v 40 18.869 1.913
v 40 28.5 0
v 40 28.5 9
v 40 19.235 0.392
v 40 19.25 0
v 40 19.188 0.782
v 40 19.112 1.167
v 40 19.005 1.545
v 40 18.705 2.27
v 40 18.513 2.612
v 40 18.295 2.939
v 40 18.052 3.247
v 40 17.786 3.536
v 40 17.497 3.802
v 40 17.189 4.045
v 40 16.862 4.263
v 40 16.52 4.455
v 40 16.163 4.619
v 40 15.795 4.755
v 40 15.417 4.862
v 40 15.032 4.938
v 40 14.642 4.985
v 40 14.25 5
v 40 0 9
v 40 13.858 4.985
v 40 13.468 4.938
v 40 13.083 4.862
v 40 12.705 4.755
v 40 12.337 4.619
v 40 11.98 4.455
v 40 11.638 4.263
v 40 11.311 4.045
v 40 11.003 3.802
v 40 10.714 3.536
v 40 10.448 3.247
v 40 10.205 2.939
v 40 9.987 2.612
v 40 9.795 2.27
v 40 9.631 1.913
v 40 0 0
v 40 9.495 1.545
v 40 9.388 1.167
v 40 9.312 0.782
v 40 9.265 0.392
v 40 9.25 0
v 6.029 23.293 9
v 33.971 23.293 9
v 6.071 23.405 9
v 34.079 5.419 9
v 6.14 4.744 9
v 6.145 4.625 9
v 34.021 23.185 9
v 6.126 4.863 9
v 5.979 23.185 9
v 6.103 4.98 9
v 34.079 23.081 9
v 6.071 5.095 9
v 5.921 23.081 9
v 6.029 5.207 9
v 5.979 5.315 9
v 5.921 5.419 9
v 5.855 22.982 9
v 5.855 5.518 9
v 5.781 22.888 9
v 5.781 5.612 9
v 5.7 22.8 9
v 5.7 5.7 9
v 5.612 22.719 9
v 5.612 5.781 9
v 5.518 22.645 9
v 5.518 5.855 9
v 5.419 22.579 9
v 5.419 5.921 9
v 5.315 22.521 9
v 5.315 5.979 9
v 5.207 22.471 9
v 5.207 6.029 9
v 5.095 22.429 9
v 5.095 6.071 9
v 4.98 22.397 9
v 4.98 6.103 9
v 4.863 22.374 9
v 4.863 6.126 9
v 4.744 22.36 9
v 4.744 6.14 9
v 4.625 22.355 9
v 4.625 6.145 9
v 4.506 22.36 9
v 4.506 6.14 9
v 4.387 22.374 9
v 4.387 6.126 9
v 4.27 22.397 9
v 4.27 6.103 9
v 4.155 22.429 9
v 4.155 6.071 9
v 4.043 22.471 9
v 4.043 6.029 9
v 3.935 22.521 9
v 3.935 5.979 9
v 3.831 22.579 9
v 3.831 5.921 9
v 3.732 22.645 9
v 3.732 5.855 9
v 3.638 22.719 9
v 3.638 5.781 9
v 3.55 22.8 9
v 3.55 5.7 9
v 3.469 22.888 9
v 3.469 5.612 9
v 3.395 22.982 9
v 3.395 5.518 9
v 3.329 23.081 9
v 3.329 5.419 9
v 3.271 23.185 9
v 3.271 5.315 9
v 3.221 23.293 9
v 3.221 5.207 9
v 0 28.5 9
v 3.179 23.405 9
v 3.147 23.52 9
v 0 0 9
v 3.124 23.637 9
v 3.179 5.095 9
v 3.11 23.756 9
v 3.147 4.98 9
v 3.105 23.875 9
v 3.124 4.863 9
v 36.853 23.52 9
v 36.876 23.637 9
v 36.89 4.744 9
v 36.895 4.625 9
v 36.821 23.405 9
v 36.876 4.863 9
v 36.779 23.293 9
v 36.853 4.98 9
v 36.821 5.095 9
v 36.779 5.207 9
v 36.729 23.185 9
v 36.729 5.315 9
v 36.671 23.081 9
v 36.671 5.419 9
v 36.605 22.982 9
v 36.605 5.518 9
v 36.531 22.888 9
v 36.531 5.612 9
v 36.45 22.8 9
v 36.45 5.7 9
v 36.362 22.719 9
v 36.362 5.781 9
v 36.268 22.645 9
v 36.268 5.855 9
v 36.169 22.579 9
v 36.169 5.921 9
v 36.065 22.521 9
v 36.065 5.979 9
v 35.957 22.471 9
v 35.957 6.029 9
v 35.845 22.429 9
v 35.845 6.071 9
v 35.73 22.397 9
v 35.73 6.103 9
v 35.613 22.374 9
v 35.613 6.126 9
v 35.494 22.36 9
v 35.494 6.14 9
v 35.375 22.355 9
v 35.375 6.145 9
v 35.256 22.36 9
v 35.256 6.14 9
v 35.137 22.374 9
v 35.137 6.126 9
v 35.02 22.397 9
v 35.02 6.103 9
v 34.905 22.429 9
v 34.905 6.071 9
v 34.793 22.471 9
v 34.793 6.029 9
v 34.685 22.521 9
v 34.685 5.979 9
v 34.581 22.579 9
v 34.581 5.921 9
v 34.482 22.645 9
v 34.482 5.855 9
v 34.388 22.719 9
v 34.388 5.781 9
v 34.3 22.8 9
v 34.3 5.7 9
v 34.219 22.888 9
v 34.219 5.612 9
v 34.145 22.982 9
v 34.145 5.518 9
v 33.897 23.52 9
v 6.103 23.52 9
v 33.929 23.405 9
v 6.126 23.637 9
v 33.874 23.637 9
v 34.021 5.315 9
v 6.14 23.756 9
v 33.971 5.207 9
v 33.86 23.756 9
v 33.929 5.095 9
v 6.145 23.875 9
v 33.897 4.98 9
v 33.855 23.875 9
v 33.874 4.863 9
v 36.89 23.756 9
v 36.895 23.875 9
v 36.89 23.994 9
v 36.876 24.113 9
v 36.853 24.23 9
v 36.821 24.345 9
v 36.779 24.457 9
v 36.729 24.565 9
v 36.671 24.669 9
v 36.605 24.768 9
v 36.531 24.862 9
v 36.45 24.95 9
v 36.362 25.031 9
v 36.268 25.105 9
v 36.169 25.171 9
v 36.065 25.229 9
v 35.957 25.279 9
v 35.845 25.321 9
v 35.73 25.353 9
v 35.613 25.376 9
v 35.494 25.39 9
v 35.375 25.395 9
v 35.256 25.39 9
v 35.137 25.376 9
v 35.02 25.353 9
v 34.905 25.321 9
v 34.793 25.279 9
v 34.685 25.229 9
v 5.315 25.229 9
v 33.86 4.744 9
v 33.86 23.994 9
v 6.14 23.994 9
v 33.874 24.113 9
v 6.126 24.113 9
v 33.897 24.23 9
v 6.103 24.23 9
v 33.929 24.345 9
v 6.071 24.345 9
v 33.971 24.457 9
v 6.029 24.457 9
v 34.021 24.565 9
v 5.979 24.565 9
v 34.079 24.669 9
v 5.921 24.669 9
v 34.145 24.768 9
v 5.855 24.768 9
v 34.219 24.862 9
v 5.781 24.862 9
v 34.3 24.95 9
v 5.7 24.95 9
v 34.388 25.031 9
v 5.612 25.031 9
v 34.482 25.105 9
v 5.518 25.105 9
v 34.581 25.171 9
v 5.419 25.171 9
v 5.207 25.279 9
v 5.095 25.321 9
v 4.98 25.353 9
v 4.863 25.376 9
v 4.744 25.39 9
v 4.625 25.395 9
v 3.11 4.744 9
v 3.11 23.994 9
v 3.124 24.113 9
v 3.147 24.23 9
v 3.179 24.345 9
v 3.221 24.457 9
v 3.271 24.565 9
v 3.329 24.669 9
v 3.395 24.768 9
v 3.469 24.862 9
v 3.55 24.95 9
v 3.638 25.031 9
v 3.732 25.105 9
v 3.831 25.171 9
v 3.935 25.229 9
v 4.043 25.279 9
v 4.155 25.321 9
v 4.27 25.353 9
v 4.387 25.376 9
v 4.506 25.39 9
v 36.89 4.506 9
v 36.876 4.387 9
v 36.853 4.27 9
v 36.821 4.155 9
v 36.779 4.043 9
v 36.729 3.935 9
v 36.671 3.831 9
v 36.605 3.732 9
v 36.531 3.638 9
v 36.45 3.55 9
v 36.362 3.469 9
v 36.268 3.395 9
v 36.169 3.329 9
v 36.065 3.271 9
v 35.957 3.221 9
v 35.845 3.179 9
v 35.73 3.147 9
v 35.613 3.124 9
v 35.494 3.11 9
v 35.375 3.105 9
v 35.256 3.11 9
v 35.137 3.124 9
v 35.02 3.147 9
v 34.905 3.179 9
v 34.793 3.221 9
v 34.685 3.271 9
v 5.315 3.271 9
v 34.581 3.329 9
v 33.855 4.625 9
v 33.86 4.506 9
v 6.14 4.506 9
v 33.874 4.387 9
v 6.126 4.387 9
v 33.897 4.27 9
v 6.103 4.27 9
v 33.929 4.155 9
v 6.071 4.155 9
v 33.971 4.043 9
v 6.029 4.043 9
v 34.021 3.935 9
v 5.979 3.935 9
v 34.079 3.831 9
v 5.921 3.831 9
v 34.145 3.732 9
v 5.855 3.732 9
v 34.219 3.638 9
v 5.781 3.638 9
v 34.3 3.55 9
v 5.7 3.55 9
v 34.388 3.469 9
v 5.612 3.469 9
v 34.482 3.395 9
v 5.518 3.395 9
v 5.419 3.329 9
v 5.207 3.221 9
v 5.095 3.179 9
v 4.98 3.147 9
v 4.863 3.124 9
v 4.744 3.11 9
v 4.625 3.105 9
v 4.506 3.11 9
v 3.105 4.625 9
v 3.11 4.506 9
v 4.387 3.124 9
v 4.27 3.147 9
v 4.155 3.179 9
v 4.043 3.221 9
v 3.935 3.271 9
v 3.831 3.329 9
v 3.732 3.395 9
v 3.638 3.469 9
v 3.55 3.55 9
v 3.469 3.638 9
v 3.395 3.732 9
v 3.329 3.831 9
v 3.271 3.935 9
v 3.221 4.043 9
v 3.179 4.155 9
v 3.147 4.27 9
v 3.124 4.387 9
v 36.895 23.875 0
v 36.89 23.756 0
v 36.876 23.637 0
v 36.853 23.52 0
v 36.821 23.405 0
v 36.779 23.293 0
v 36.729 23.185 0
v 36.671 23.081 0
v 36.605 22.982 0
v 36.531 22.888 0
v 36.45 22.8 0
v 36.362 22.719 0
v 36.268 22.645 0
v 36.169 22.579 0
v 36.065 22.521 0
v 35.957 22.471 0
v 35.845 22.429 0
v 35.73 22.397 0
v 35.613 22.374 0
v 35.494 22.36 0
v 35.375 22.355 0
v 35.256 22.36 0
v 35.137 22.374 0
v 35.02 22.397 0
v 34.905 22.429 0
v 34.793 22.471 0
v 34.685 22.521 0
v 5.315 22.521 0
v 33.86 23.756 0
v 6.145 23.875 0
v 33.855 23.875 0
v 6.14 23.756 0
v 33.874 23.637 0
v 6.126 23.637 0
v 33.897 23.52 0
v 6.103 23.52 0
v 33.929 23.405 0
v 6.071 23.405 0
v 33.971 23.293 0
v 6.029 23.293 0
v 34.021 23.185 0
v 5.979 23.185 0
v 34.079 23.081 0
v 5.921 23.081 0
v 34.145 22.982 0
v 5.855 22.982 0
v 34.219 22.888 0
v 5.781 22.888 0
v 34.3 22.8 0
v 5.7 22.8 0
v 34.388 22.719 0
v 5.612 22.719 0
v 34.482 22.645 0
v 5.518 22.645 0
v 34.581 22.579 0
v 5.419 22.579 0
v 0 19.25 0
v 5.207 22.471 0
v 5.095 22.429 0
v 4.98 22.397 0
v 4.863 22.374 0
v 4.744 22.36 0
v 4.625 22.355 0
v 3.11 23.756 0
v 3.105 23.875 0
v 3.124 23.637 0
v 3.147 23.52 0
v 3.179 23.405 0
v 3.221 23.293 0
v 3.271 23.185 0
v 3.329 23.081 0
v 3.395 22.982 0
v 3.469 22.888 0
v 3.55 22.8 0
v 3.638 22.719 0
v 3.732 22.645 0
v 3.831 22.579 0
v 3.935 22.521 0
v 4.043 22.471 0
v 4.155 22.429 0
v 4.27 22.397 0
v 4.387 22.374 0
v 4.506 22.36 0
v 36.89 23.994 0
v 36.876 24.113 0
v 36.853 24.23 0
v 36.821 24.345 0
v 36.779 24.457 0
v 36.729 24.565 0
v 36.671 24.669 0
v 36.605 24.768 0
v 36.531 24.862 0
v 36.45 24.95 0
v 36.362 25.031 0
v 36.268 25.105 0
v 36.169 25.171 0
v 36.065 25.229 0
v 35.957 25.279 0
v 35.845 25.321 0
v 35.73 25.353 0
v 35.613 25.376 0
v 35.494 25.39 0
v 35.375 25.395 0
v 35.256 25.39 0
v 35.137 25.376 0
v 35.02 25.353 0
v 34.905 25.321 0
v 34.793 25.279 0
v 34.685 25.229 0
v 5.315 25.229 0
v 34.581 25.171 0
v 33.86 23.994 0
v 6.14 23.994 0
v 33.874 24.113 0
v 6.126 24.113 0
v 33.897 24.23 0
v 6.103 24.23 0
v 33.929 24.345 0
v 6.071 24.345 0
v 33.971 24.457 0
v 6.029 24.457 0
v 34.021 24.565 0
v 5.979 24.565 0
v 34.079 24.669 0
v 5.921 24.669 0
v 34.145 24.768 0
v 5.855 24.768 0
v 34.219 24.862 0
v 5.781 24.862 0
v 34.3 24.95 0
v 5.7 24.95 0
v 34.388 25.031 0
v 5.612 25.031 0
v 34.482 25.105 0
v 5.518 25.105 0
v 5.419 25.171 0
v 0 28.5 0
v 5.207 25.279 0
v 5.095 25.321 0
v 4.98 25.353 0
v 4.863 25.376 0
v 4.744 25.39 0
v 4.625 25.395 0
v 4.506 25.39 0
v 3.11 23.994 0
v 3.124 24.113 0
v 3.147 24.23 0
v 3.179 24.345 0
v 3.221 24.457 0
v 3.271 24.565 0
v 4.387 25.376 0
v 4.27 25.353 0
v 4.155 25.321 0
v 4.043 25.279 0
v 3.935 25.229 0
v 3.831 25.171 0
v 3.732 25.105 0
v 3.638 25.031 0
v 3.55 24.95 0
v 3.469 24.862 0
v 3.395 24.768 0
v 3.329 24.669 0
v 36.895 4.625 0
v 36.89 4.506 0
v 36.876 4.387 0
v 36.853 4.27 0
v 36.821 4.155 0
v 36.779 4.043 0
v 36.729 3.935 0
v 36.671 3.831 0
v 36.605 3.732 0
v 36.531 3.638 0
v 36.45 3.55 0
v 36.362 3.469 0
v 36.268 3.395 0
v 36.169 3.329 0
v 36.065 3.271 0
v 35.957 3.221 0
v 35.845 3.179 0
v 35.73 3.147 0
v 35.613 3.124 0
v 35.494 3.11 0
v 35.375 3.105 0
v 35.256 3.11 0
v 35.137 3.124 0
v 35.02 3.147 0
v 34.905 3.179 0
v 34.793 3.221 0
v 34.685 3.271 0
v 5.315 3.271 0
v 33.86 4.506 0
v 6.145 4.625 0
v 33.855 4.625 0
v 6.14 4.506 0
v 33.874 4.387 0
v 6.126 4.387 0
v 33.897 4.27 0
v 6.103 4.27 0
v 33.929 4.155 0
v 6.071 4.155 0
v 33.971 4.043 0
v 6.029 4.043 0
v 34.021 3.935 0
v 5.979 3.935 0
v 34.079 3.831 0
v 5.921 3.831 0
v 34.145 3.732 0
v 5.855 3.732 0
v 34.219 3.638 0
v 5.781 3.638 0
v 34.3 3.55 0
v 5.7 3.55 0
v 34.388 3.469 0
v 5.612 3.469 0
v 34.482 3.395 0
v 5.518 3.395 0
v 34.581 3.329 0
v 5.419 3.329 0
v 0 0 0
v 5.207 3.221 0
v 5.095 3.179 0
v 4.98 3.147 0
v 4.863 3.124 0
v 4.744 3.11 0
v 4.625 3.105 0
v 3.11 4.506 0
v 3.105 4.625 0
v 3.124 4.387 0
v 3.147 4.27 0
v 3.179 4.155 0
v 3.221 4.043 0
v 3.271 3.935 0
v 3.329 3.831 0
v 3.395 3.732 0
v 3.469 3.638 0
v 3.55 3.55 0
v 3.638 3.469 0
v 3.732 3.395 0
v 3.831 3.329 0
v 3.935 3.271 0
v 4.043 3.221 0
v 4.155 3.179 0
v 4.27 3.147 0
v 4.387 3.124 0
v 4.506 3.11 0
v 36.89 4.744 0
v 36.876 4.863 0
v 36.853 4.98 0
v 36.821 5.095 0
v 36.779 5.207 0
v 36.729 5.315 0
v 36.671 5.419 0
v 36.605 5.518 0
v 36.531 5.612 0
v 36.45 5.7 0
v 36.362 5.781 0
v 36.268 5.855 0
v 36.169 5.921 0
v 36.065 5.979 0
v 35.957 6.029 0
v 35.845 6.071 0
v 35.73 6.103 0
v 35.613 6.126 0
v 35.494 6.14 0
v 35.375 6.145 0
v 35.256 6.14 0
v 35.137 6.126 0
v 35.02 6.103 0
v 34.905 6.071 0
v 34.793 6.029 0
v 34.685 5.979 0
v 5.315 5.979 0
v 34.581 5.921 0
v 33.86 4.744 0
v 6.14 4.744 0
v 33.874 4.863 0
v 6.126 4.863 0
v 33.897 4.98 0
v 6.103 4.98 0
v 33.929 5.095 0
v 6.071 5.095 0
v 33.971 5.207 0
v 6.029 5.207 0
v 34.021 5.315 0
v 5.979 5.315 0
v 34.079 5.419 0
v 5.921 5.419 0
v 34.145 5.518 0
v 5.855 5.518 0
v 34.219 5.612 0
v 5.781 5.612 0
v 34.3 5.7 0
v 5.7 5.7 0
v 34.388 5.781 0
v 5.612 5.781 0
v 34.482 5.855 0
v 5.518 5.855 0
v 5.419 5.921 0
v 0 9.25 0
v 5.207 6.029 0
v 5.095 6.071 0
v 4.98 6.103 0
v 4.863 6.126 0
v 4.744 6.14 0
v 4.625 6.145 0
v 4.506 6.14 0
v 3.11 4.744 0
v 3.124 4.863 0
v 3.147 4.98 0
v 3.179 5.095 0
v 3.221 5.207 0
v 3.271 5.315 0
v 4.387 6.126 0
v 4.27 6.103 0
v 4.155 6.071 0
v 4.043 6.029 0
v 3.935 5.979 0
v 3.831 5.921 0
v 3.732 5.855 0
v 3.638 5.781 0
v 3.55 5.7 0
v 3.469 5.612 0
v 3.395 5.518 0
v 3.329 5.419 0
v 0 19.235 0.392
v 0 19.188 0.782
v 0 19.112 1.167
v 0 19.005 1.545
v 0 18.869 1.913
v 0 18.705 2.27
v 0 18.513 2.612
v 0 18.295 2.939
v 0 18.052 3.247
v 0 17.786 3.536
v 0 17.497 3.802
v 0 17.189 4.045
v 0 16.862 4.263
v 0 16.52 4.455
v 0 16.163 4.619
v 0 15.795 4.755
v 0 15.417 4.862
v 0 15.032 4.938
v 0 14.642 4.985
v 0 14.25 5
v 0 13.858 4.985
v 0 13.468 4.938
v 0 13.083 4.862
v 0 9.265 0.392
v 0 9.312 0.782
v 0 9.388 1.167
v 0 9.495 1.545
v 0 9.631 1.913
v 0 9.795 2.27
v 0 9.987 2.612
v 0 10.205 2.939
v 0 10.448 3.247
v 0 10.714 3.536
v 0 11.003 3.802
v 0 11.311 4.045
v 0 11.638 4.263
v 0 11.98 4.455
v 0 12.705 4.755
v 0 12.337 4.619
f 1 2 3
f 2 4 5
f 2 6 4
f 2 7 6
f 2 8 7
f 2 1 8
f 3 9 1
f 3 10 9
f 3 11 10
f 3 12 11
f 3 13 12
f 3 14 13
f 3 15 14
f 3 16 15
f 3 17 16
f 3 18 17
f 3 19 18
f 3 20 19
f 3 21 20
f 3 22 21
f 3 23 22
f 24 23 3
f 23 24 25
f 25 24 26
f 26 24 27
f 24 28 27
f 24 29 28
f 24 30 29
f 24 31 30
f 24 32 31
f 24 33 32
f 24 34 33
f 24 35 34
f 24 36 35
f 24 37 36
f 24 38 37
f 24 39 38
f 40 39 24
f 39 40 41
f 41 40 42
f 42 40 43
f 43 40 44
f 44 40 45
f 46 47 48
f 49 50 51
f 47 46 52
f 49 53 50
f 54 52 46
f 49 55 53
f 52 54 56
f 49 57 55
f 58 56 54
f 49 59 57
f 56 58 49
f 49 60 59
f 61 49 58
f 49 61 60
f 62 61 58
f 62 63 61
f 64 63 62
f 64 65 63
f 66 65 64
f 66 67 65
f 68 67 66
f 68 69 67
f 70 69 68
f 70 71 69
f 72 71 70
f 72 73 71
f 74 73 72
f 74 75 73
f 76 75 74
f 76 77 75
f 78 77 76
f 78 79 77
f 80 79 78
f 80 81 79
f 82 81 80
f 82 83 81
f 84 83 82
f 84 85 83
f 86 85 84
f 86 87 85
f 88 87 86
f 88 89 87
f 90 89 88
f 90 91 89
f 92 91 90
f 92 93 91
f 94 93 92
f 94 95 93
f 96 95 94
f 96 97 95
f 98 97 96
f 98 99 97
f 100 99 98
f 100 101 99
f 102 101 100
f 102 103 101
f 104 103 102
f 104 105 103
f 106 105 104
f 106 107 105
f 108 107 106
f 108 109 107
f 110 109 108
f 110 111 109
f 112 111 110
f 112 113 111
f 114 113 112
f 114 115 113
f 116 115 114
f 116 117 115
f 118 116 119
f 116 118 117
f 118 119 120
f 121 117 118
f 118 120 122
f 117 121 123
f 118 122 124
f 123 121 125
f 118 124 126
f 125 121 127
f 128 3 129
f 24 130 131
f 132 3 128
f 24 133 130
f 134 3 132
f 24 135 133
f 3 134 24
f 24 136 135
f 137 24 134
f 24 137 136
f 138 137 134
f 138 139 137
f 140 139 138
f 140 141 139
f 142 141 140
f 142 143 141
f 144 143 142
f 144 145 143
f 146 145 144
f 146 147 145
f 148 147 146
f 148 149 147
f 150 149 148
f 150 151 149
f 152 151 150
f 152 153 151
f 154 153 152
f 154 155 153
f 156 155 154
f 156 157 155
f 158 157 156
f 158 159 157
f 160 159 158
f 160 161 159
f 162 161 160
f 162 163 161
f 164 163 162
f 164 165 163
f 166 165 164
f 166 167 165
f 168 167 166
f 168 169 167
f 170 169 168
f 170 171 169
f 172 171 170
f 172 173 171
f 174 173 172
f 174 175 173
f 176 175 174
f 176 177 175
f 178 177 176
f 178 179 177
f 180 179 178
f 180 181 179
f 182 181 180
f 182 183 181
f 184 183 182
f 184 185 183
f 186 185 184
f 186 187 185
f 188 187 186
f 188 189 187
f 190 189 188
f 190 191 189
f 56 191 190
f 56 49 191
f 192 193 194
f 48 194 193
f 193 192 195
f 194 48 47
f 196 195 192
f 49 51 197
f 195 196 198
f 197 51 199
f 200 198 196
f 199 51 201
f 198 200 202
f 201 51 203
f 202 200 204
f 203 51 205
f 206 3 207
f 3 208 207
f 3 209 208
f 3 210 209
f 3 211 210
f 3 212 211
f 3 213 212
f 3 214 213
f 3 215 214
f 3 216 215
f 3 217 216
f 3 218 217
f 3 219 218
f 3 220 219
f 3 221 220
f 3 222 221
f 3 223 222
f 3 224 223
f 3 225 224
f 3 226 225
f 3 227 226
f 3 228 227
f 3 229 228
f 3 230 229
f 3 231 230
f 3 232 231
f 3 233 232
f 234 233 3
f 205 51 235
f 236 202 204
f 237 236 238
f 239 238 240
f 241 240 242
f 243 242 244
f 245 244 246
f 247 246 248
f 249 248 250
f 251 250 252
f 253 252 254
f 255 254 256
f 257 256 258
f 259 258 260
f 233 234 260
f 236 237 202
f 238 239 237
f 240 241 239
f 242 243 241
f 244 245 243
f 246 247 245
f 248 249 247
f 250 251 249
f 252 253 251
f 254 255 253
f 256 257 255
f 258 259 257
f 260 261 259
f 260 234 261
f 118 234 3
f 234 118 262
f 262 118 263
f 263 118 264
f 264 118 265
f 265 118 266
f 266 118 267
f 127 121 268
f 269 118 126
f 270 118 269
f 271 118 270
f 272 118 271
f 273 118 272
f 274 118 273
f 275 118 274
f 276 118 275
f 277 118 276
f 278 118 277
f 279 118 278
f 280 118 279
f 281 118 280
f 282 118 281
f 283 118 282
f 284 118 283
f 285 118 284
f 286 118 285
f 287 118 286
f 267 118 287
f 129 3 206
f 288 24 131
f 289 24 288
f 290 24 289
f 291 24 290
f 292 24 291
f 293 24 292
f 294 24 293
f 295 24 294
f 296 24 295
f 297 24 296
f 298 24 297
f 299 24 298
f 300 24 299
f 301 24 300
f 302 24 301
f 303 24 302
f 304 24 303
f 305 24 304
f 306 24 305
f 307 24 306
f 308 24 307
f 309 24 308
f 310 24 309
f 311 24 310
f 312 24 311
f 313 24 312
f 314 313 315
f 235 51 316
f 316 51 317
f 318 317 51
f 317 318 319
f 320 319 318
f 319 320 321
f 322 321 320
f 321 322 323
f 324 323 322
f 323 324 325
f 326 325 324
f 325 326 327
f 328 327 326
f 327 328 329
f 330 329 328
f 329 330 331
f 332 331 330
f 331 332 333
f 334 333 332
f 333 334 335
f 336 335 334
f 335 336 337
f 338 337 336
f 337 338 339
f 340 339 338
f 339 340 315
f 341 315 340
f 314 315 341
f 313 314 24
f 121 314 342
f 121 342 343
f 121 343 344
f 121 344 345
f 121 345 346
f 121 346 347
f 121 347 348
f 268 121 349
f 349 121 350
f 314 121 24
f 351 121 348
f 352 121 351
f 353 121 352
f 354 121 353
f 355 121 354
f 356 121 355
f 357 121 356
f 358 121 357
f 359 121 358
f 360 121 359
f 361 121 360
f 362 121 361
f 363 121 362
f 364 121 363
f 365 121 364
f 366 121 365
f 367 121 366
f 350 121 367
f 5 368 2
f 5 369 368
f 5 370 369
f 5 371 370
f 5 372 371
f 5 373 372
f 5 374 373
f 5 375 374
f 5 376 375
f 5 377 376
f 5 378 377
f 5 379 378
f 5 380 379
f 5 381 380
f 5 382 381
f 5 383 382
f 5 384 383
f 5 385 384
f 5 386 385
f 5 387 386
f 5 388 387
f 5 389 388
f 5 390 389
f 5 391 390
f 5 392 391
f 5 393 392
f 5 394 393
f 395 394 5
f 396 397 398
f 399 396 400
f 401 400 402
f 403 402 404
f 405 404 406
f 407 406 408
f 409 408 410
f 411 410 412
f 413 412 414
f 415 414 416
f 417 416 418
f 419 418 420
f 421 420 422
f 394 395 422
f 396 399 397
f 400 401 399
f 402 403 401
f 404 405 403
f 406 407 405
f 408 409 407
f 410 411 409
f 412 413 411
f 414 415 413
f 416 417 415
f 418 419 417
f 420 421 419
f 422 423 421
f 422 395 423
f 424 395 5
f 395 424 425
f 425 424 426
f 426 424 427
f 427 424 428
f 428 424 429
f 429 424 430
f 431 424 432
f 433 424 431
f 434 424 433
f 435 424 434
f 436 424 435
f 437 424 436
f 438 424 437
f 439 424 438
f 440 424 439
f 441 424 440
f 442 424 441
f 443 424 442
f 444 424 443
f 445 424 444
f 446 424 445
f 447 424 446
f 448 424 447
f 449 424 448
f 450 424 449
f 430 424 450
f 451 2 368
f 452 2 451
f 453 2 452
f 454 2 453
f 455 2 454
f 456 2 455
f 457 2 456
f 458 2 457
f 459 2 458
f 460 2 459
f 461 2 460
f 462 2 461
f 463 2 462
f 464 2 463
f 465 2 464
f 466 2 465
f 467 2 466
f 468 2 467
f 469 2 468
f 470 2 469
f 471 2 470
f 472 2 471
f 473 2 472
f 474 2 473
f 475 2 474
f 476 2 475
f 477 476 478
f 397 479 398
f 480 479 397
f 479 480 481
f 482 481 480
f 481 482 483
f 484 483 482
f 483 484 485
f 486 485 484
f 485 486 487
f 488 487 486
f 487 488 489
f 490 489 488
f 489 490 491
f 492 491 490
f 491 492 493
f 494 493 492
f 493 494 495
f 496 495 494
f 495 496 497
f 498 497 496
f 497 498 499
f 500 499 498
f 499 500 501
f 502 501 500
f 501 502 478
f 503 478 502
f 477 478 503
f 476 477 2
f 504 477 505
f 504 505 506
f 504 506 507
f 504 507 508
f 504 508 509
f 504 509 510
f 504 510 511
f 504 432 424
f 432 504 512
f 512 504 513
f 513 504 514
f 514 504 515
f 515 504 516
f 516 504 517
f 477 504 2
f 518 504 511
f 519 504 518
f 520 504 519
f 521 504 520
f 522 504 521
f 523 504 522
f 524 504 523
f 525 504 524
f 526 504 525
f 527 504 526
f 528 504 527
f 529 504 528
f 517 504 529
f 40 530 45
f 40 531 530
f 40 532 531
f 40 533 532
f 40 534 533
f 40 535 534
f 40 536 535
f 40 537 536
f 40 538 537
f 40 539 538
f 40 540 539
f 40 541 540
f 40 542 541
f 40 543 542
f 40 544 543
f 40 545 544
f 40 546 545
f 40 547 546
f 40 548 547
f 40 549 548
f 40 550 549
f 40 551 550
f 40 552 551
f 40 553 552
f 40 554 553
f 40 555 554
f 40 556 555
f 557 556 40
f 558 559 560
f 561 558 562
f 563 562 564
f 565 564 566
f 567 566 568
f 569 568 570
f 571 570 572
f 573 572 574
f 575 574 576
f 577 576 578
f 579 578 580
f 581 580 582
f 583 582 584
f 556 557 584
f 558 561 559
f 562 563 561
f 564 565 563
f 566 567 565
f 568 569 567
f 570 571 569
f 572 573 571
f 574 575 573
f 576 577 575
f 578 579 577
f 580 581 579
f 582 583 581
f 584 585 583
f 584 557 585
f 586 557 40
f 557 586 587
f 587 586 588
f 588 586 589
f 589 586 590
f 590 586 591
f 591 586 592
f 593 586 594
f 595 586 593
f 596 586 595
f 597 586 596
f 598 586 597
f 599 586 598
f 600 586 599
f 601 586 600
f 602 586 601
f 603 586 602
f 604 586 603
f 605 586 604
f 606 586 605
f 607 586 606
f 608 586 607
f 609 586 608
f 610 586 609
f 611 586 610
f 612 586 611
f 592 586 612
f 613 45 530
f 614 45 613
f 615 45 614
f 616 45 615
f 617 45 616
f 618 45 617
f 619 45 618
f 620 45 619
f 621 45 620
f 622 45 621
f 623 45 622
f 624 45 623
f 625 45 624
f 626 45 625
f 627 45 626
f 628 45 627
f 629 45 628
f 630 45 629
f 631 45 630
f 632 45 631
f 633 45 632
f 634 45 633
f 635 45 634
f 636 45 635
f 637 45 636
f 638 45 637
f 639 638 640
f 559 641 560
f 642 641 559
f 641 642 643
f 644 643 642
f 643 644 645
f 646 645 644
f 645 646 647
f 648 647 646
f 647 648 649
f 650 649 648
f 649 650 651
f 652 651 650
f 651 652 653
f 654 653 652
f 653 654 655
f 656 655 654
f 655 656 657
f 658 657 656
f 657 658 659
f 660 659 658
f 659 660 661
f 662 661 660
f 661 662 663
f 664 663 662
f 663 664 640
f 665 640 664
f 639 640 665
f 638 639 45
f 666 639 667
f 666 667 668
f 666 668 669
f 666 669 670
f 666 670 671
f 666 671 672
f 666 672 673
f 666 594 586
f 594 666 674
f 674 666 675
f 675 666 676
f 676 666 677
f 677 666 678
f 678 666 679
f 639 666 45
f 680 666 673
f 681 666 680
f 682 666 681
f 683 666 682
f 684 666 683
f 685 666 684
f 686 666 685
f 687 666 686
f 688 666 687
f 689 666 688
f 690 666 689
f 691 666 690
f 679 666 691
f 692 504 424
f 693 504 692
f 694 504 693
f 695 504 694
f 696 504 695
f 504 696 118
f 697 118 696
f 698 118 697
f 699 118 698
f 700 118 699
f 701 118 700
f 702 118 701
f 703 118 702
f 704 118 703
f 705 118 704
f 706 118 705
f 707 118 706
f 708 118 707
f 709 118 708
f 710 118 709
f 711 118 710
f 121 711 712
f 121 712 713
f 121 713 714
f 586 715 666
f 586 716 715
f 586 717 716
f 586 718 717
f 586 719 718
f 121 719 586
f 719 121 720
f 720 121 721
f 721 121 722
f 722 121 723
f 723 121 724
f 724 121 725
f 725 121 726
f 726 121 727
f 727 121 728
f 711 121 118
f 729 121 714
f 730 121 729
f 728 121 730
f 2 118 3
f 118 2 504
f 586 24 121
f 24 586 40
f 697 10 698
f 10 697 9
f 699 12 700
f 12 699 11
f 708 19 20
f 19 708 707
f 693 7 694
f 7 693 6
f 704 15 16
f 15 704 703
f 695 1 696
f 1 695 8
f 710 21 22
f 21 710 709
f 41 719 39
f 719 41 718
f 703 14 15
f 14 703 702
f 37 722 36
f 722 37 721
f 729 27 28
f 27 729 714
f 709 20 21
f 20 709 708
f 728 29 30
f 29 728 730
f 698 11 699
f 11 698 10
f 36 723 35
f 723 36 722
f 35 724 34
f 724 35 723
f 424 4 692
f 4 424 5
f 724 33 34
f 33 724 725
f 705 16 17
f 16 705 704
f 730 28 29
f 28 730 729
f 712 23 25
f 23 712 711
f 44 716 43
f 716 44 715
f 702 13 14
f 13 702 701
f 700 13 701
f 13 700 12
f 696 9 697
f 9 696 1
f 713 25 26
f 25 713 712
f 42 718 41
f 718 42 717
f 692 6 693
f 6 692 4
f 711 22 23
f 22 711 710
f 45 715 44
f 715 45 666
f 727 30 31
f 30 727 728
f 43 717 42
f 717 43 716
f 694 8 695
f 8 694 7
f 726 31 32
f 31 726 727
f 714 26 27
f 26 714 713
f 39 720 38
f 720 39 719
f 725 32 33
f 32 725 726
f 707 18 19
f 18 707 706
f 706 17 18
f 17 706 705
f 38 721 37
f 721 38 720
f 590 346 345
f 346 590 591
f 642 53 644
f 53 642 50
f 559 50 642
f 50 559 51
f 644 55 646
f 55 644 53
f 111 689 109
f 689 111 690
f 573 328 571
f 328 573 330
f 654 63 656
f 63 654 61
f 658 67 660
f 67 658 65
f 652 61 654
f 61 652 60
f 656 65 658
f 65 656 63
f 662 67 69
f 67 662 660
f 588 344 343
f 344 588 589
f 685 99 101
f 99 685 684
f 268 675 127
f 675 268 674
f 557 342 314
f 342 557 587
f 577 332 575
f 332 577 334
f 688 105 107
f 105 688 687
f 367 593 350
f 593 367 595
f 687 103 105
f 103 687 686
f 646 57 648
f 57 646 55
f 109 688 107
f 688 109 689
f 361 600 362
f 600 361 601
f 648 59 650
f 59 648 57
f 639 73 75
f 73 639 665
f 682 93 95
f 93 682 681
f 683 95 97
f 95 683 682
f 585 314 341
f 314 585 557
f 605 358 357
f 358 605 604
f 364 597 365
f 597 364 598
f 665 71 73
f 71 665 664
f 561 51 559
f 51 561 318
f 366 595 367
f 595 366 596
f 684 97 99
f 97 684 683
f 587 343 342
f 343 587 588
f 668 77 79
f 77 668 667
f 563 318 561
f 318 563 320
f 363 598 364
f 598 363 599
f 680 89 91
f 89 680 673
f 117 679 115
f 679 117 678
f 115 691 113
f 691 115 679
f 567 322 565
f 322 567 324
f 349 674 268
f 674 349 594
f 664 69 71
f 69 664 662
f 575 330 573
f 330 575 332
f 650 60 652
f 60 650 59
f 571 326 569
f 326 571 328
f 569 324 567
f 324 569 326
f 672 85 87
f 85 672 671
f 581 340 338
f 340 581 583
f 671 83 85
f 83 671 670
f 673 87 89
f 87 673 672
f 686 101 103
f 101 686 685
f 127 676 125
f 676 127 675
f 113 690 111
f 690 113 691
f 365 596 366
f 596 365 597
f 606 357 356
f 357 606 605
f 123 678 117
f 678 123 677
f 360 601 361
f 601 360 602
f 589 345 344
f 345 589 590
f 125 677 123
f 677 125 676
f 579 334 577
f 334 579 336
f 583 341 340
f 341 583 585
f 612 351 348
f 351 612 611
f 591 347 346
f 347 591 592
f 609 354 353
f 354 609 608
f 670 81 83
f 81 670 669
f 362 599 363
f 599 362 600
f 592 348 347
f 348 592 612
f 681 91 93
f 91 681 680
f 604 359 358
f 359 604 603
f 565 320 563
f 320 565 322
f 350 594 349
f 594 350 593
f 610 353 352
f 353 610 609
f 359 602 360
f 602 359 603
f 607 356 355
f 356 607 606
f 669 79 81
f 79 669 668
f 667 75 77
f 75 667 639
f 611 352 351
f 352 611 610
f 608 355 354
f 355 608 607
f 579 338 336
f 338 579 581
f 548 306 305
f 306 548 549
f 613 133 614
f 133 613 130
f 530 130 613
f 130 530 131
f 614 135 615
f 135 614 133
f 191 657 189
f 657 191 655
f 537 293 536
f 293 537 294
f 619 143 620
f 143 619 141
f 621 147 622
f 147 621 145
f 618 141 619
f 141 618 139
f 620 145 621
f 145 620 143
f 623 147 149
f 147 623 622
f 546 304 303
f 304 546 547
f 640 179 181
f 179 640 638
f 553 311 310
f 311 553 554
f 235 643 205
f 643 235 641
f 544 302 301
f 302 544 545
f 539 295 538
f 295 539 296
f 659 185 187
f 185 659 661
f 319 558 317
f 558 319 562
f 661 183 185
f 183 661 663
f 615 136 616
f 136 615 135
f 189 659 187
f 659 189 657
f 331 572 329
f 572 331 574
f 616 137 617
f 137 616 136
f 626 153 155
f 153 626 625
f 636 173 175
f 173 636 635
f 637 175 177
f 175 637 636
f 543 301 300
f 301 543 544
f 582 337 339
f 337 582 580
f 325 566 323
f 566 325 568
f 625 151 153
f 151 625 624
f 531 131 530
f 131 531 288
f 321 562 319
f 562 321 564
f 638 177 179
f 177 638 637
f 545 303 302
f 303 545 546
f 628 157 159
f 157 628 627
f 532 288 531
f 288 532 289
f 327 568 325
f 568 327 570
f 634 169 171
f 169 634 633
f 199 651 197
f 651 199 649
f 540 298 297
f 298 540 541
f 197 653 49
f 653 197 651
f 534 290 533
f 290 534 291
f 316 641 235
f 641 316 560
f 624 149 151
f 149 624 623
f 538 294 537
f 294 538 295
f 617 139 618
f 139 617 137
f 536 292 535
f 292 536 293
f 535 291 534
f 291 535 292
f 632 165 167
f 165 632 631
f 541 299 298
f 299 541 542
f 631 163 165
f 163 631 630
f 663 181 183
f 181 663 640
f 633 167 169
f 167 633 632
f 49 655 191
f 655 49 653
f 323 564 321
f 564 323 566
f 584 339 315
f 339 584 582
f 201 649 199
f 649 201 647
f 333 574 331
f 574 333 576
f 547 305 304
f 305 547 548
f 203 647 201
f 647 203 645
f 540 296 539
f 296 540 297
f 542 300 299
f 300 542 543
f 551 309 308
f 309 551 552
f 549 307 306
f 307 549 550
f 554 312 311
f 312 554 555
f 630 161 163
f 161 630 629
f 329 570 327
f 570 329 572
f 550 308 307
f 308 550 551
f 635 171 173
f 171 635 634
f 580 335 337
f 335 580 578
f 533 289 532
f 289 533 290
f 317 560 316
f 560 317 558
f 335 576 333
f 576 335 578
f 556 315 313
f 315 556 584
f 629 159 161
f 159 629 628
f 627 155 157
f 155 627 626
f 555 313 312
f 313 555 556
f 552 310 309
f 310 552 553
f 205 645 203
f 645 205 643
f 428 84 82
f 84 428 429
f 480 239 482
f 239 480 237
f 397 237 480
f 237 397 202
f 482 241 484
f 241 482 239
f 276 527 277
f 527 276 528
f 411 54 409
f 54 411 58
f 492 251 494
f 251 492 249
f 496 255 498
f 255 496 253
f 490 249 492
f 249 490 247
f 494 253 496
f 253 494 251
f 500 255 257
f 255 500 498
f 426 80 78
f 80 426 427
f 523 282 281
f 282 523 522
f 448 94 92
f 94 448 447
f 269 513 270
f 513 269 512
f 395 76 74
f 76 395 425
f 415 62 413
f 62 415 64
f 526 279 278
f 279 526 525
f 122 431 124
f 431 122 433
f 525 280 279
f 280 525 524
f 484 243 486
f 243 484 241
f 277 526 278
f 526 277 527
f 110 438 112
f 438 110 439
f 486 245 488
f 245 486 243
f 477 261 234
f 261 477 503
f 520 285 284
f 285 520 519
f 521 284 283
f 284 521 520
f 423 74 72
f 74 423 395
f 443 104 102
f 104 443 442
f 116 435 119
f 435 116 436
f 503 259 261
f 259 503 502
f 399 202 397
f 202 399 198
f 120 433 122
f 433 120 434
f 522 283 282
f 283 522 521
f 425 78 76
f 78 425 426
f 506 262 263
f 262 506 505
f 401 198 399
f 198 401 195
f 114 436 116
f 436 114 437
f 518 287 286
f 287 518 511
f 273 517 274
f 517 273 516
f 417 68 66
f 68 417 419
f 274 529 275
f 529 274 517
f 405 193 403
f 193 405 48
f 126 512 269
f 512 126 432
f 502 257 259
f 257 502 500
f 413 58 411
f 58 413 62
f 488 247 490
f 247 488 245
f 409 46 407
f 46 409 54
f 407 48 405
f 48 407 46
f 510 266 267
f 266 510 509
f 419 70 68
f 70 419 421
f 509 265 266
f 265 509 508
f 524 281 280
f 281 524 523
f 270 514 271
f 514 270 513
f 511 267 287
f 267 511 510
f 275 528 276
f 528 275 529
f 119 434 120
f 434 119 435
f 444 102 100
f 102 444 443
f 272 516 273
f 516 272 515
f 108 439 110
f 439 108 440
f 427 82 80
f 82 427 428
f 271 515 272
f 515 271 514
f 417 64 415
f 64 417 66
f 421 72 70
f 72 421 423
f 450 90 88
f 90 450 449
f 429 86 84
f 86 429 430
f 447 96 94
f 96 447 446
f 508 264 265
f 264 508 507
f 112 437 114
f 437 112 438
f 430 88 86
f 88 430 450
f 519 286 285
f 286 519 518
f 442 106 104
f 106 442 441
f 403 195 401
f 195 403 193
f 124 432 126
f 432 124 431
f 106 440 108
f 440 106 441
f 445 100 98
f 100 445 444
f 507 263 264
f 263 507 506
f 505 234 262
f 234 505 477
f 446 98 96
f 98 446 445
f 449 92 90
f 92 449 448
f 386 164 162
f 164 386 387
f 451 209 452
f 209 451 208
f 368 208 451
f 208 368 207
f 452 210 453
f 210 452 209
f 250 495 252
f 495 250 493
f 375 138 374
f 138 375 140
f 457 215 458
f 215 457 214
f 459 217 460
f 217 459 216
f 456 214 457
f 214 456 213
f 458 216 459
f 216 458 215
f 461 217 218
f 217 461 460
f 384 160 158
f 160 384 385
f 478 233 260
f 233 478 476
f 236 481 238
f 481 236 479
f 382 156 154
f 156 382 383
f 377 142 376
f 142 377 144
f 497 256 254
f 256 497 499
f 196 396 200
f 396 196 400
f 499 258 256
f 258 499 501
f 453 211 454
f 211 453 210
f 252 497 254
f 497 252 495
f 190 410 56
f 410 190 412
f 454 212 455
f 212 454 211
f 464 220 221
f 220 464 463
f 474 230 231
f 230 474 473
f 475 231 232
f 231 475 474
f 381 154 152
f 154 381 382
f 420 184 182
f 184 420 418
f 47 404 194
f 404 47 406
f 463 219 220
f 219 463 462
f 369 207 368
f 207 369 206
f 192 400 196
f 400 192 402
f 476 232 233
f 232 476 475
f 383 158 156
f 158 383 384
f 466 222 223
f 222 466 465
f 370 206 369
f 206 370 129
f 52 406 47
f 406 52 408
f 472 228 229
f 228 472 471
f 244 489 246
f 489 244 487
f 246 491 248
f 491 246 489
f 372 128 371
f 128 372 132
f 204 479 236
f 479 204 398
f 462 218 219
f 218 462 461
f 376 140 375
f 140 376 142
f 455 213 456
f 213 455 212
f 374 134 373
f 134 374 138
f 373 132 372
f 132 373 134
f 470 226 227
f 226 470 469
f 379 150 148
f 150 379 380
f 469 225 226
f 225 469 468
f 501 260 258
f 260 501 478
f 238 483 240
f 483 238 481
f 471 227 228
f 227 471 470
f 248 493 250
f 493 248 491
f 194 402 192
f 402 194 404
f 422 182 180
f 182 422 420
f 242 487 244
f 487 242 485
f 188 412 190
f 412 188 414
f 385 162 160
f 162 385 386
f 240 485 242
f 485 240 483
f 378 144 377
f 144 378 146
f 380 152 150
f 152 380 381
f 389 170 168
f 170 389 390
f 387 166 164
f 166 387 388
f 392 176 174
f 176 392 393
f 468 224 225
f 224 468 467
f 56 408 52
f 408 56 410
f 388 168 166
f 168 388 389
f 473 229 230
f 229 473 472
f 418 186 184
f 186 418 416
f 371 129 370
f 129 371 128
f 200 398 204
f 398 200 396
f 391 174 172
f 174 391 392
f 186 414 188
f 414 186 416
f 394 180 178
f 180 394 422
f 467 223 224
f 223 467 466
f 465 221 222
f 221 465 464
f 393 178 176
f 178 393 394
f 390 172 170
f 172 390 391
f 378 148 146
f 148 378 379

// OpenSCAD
// file: hex_nut.scad
module hex_nut(width, height, screw)
{
	w = width;
	w2 = width / 2;
	s = w2 / cos(30);
	h = w2 * tan(30);
	
	translate([-s/2, -w2, 0])
	difference()
	{
		linear_extrude(height=height)
			polygon([[0,0],[s,0],[s+h,w2],[s,w],[0,w],[-h,w2],[0,0]]);
		translate([s/2, w2, -0.1])
			cylinder(r = screw / 2, h = height+0.2, $fn=20);
	}
}

hex_nut(5.25, 2, 3);
// file: bearing_dims.scad
/*
	bore = v[0];
	outer = v[1];
	len = v[2];
	ring_space = v[3];
	ring_dia = v[4];
	ring_gap = v[5];
*/

linear_bearing_dims = [
	[3,7,10,0,7,0],
	[4,8,12,0,8,0],
	[5,10,15,10.2,9.6,1.1],
	[6,12,19,13.5,11.5,1.1],
	[8,15,24,17.5,14.3,1.1],
	[10,19,29,22,18,1.3],
	[12,21,30,23,20,1.3],
	[13,23,32,23,22,1.3],
	[16,28,37,26.5,27,1.6],
	[20,32,42,30.5,30.5,1.6],
	[25,40,59,41,38,1.85],
	[30,45,64,44.5,43,1.85],
	[35,52,70,49.5,49,2.1],
	[40,60,80,60.5,57,2.1],
	[50,80,100,74,76.5,2.6],
	[60,90,110,85,86.5,3.15],
	[80,120,140,105.5,116,4.15],
	[100,150,150,125.5,145,4.15]
];

/*
	d = v[0];
	h = v[1];
	e = v[2];
	w = v[3];		// overall width
	l = v[4];		// overall length
	f = v[5];
	g = v[6];
	b = v[7];		// screw spacing along width
	c = v[8];		// screw spacing along length
	k = v[9];
	t = v[10];
	s1 = v[11];
	s2 = v[12];
	L1 = v[13];
*/

linear_bearing_block_dims = [
	[6,9,15,30,25,18,15,20,15,5,6,4,3.4,8],
	[8,11,17,34,30,22,18,24,18,5,6,4,3.4,8],
	[10,13,20,40,35,26,21,28,21,6,8,5,4.3,12],
	[12,15,21,42,36,28,24,30.5,26,5.75,8,5,4.3,12],
	[13,15,22,44,39,30,24.5,33,26,5.5,8,5,4.3,12],
	[16,19,25,50,44,38.5,32.5,36,34,7,9,5,4.3,12],
	[20,21,27,54,50,41,35,40,40,7,11,6,5.2,12],
	[25,26,38,76,67,51.5,42,54,50,11,12,8,7,18],
	[30,30,39,78,72,59.5,49,58,58,10,15,8,7,18],
	[35,34,45,90,80,68,54,70,60,10,18,8,7,18],
	[40,40,51,102,90,78,62,80,60,11,20,10,8.7,25],
	[50,52,61,122,110,102,80,100,80,11,25,10,8.7,25],
	[60,58,66,132,122,114,94,108,90,12,30,10,10.7,25]
];

linear_bearing_long_block_dims = [
	[8,11,17,34,59,22,18,24,42,5,6,4,3.4,8],
	[10,13,20,40,68,26,21,28,46,6,8,5,4.3,12],
	[12,15,21,42,70,28,24,30.5,50,5.75,8,5,4.3,12],
	[13,15,22,44,75,30,24.5,33,50,5.5,8,5,4.3,12],
	[16,19,25,50,85,38.5,32.5,36,60,7,9,5,4.3,12],
	[20,21,27,54,96,41,35,40,70,7,11,6,5.2,12],
	[25,26,38,76,130,51.5,42,54,100,11,12,8,7,18],
	[30,30,39,78,140,59.5,49,58,110,10,15,8,7,18],
	[35,34,45,90,155,68,54,70,120,10,18,8,7,18],
	[40,40,51,102,175,78,62,80,140,11,20,10,8.7,25],
];

/*
	d = v[0];
	D = v[1];
	L = v[2];
	D1 = v[3];
	H = v[4];
	pcd = v[5];
	d1 = v[6];
	d2 = v[7];
	h = v[8];
*/

linear_bearing_round_flange_dims = [
	[6,12,19,28,5,20,3.4,6.5,3.3],
	[8,15,24,32,5,24,3.4,6.5,3.3],
	[10,19,29,40,6,29,4.5,8,4.4],
	[12,21,30,42,6,32,4.5,8,4.4],
	[13,23,32,43,6,33,4.5,8,4.4],
	[16,28,37,48,6,38,4.5,8,4.4],
	[20,32,42,54,8,43,5.5,9.5,5.4],
	[25,40,59,62,8,51,5.5,9.5,5.4],
	[30,45,64,74,10,60,6.6,11,6.5],
	[35,52,70,82,10,67,6.6,11,6.5],
	[40,60,80,96,13,78,9,14,8.6],
	[50,80,100,116,13,98,9,14,8.6],
	[60,90,110,134,18,112,11,17.5,10.6]
];

function get_dims_for_shaft_size(shaft_size, dims) = 
	dims[search(shaft_size, dims, 1, 0)[0]];
// file: ShefRap_common.scad
include <bearing_dims.scad>;

base_t = 4;

nut_3mm = 5.25;

clearance = 0.7;

/*
 * Rod sizes
 */

x_axis_rod = 10;
y_axis_rod = 10;
z_axis_rod = 12;

x_axis_bearing_dims = get_dims_for_shaft_size(x_axis_rod, linear_bearing_dims);
x_axis_bearing_dia = x_axis_bearing_dims[1];
x_axis_bearing_len = x_axis_bearing_dims[2];

y_axis_bearing_dims = get_dims_for_shaft_size(y_axis_rod, linear_bearing_block_dims);
y_axis_bearing_len = y_axis_bearing_dims[4];
y_axis_bearing_wid = y_axis_bearing_dims[3];
y_axis_bearing_mid_hgt = y_axis_bearing_dims[1];
y_axis_bearing_rod_clr = y_axis_bearing_mid_hgt - (y_axis_rod / 2);

x_axis_rod_separation = y_axis_bearing_len + (2 * (base_t + nut_3mm) + x_axis_rod);

echo(x_axis_rod_separation);

ex_hole_l = 46.785;
ex_hole_w = 24;
ex_hole_space = 6;


bb_support_t = 3.5;

function get_bb_dims(b_dia, b_len) = 
	[
		(b_len + 2 * bb_support_t) / 5,	// Individual bearing block width
		b_dia + (2 * bb_support_t),		// ... depth
		0.75 * b_dia,							// ... height
		(b_len + 2 * bb_support_t) / 5,	// ... and gap spacing between blocks
		(b_len + 2 * bb_support_t)			// Total bearing block length
	];
// main file
include <ShefRap_common.scad>;
include <bearing_dims.scad>;
use <hex_nut.scad>;

module x_end_top()
{
	thickness = (x_axis_rod / 2) + base_t;

	nut = nut_3mm;

	width =  y_axis_bearing_wid;
	length = (2 * (base_t + nut) + x_axis_rod);

	echo(width);
	echo(length);
	echo(thickness);
	echo(y_axis_bearing_rod_clr);

	y_offset_1 = (nut / 2) + 2;
	y_offset_2 = (base_t + nut) + x_axis_rod + y_offset_1;

	difference()
	{
		union()
		{
			cube([width, length, thickness]);
		}

		translate([-0.1, (base_t + nut + (x_axis_rod / 2)), 0])
			rotate([0,90,0])
				cylinder(r = x_axis_rod / 2, h = width + 0.2);

		translate([(nut/2)+2, y_offset_1,-0.1])
		{
			cylinder(r = 1.52, h = thickness + 0.2);
		}
		translate([width - ((nut/2)+2), y_offset_1,-0.1])
		{
			cylinder(r = 1.52, h = thickness + 0.2);
		}
		translate([(nut/2)+2, length - y_offset_1,-0.1])
		{
			cylinder(r = 1.52, h = thickness + 0.2);
		}
		translate([width - ((nut/2)+2), length - y_offset_1,-0.1])
		{
			cylinder(r = 1.52, h = thickness + 0.2);
		}
	}
}

x_end_top($fn=80);
